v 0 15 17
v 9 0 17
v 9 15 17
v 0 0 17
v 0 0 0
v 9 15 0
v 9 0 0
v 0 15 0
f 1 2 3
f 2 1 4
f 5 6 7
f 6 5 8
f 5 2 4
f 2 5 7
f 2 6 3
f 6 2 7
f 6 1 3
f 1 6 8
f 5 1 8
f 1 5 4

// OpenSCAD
// Generated by SolidPython 1.0.1 on 2020-07-29 00:46:55


cube(size = [9, 15, 17]);
/***********************************************
*********      SolidPython code:      **********
************************************************
 
# import packages: SolidPython
from solid import *
from solid.utils import *
from itertools import chain, combinations, permutations


class Resize:

    def __init__(self, scad_file):
        self.scad_file = scad_file
        #self.scad_file = import_scad(scad_file)
        # cone/cylinder param:
        self.r1 = 0
        self.r2 = 0
        self.h = 0
        # rectangular prism param:
        self.w = 0
        self.l = 0
        # ellipse param:
        self.r = 0

    # import OpenScad code (file name corresponds to shape)


    # classify shape + parameters
    def assign(self, param1, param2, param3):
        if self.scad_file == 'cone.scad':
            self.r1 = param1
            self.r2 = param2
            self.h = param3
        elif self.scad_file == 'cylinder.scad':
            self.r1 = param1
            self.r2 = param2
            self.h = param3
        elif self.scad_file == 'rectangularPrism.scad':
            self.h = param1
            self.l = param2
            self.w = param3
        else:
            self.r = param1
            self.h = param2

    # resize parameters
    def iterate(self):
        x = range(3, 20, 2)
        i = 1
        if self.scad_file == 'cone.scad':
            tempList = list(permutations(x, 2))
            for temp in tempList:
                param1 = temp[0]
                param2 = temp[1]
                filepath = 'produced_scad_files/' + 'cone' + str(param1) + '_' + str(param2) + '_' + '.scad'
                scad_render_to_file(cylinder(h=param1, r1=param2, r2=0), filepath)

        elif self.scad_file == 'cylinder.scad':
            tempList = list(permutations(x, 3))
            for temp in tempList:
                param1 = temp[0]
                param2 = temp[1]
                filepath = 'produced_scad_files/' + 'cylinder' + str(param1) + '_' + str(param2) + '_' + '.scad'
                scad_render_to_file(cylinder(h=param1, r1=param2, r2=param2), filepath)

        elif self.scad_file == 'rectangularPrism.scad':
            tempList = list(permutations(x, 3))
            for temp in tempList:
                param1 = temp[0]
                param2 = temp[1]
                param3 = temp[2]
                filepath = 'produced_scad_files/' + 'rectangularPrism' + str(param1) + '_' + str(param2) + '_' + str(
                    param3) + '.scad'
                scad_render_to_file(cube(size=(param1, param2, param3)), filepath)

        elif self.scad_file == 'ellipse.scad':
            tempList = list(permutations(x, 4))
            for temp in tempList:
                param1 = temp[0]
                param2 = temp[1]
                param3 = temp[2]
                param4 = temp[3]
                filepath = 'produced_scad_files/' + 'ellipse' + str(param1) + '_' + str(param2) + '_' + str(param3) + '_' + str(param4) + '.scad'
                scad_render_to_file(scale([param1, param2, param3])(sphere(r=param4)), filepath)

    def render_to_scadfile(self):
        scad_render_to_file(scad, 'example.scad') 
 
************************************************/
